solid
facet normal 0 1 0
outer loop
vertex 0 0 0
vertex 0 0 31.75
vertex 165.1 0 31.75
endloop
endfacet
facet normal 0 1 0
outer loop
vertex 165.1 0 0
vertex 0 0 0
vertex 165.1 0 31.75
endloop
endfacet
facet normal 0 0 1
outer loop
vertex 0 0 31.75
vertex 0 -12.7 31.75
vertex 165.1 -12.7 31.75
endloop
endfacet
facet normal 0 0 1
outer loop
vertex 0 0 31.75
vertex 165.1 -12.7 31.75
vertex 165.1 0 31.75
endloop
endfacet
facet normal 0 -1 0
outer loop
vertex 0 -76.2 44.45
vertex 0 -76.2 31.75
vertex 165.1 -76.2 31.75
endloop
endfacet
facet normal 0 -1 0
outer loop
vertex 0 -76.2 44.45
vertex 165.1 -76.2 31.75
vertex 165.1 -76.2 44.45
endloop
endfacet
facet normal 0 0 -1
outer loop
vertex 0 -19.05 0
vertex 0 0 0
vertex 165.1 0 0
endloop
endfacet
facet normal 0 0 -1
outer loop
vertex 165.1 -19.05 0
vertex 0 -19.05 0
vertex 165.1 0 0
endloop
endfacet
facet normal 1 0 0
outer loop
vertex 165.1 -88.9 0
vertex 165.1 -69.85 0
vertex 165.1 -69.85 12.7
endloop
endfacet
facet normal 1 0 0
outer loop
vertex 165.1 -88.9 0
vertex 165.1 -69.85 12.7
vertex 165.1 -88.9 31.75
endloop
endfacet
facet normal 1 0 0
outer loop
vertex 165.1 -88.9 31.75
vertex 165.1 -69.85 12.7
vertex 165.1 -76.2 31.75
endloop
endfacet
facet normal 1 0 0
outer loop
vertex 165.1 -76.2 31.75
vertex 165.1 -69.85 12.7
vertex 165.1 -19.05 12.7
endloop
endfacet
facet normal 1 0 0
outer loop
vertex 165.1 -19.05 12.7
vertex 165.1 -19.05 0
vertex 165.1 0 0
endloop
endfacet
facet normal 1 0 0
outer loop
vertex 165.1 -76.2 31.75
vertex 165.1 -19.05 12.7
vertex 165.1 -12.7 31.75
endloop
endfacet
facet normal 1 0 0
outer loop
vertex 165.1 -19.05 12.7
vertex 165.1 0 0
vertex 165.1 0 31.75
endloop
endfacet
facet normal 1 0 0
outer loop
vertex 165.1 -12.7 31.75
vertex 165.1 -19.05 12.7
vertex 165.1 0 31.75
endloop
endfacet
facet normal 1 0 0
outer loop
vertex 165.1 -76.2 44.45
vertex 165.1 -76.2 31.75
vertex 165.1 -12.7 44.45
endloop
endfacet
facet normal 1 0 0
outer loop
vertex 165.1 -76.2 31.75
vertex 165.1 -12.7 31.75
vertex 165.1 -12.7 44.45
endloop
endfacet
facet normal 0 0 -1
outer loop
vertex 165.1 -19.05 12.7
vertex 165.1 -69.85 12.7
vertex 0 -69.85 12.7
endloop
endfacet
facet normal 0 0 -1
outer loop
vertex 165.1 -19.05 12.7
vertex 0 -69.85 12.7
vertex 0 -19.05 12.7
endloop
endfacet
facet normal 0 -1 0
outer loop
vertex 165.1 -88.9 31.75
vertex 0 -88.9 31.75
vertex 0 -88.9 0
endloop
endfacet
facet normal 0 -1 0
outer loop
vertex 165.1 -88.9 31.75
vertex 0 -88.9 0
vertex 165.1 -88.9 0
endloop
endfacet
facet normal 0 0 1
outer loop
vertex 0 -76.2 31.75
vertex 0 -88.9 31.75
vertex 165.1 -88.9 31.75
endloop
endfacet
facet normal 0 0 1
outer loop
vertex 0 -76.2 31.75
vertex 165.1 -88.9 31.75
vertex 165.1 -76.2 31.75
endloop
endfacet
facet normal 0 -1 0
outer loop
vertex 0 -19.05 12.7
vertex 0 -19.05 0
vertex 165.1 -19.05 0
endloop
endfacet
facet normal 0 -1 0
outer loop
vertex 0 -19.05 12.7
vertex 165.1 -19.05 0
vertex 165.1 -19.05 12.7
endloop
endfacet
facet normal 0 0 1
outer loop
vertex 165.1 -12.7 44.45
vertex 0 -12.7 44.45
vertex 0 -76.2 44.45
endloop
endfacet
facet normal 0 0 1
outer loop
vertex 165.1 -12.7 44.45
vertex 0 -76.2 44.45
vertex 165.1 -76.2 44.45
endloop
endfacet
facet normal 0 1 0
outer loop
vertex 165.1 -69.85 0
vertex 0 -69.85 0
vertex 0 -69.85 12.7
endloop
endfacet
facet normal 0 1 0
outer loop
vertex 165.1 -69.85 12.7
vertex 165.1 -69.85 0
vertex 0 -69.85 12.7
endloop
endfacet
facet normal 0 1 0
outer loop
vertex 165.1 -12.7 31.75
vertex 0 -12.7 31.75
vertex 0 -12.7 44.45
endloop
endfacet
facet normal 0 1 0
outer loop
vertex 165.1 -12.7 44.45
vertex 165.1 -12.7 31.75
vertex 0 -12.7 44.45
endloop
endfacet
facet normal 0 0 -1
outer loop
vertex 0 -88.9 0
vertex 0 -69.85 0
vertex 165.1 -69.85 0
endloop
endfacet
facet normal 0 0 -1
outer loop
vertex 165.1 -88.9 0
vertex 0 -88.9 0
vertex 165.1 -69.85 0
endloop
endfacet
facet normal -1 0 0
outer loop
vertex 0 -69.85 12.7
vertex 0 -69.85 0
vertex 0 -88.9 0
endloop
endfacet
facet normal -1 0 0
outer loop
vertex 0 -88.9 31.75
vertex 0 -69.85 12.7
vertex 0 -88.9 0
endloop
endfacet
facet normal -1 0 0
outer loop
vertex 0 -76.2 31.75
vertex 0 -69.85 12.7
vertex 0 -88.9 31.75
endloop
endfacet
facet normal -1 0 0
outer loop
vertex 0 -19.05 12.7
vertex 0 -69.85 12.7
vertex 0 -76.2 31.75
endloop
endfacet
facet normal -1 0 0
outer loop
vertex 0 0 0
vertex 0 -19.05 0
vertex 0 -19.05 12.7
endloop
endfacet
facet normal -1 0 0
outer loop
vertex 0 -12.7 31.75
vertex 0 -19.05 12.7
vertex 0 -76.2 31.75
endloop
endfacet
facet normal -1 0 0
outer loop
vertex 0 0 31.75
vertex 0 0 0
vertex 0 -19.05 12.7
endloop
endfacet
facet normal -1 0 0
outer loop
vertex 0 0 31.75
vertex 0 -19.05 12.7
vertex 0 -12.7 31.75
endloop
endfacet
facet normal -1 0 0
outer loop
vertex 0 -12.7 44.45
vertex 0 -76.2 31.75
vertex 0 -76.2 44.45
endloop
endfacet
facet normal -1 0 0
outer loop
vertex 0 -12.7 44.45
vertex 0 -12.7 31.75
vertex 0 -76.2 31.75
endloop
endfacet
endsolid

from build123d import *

# Parameters (mm, degrees)
F0_W     = 165.1
F0_H     = 44.45
F1_DEPTH = 88.9
F2_W     = 50.8
F2_H     = 12.7
F3_DEPTH = 165.1
F4_W     = 12.7
F4_H     = 12.7
F5_DEPTH = 165.1


with BuildPart() as f1:
    # F0 (on Front) → F1 (new body)
    with BuildSketch(Plane.XZ):
        with Locations((82.55, 22.225)):
            Rectangle(F0_W, F0_H)
    extrude(amount=F1_DEPTH)

    # F2 (on face) → F3 (cut)
    with BuildSketch(Plane.YZ.offset(165.1)):
        with Locations((-44.45, 6.35)):
            Rectangle(F2_W, F2_H)
    extrude(amount=-F3_DEPTH, mode=Mode.SUBTRACT)

    # F4 (on face) → F5 (cut)
    with BuildSketch(Plane.YZ.offset(165.1)):
        with Locations((-82.55, 38.1)):
            Rectangle(F4_W, F4_H)
        with Locations((-6.35, 38.1)):
            Rectangle(F4_W, F4_H)
    extrude(amount=-F5_DEPTH, mode=Mode.SUBTRACT)


solid = f1.part
